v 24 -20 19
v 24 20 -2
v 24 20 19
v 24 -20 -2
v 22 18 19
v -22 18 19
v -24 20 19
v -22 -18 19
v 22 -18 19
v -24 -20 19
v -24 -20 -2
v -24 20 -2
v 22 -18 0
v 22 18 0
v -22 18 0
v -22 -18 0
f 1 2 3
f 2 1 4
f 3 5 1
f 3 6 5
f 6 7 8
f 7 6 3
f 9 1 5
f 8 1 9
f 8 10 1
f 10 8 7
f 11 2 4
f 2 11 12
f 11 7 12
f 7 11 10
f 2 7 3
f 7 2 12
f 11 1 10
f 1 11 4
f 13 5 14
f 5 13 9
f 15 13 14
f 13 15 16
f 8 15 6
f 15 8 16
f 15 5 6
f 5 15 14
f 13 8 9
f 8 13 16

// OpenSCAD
THICK = 2;

FINGER_AREA_WIDTH = 26;
FINGER_AREA_DEPTH = 18;
FINGER_AREA_HEIGHT = 19;

SWITCH_AREA_SIZE = 9;

INN_WIDTH = SWITCH_AREA_SIZE + FINGER_AREA_WIDTH + SWITCH_AREA_SIZE;
INN_DEPTH = SWITCH_AREA_SIZE + FINGER_AREA_DEPTH + SWITCH_AREA_SIZE;
INN_HEIGHT = 19;

OUT_WIDTH = THICK + INN_WIDTH + THICK;
OUT_DEPTH = THICK + INN_DEPTH + THICK;
OUT_HEIGHT = THICK + INN_HEIGHT;


module body() {
  translate([0, 0, OUT_HEIGHT/2 - THICK])
  cube([OUT_WIDTH, OUT_DEPTH, OUT_HEIGHT], center = true);
}

module cavity() {
  translate([0, 0, INN_HEIGHT/2])
  cube([INN_WIDTH, INN_DEPTH, INN_HEIGHT], center = true);
}

module part() {
    difference() {
      body();
      cavity();
    }
}

//mirror([1,0,0])
//rotate(a=[0,180,0])
//translate([-200, 100, 0])
part();
//body();
//cavity();
//opening_bevel();
